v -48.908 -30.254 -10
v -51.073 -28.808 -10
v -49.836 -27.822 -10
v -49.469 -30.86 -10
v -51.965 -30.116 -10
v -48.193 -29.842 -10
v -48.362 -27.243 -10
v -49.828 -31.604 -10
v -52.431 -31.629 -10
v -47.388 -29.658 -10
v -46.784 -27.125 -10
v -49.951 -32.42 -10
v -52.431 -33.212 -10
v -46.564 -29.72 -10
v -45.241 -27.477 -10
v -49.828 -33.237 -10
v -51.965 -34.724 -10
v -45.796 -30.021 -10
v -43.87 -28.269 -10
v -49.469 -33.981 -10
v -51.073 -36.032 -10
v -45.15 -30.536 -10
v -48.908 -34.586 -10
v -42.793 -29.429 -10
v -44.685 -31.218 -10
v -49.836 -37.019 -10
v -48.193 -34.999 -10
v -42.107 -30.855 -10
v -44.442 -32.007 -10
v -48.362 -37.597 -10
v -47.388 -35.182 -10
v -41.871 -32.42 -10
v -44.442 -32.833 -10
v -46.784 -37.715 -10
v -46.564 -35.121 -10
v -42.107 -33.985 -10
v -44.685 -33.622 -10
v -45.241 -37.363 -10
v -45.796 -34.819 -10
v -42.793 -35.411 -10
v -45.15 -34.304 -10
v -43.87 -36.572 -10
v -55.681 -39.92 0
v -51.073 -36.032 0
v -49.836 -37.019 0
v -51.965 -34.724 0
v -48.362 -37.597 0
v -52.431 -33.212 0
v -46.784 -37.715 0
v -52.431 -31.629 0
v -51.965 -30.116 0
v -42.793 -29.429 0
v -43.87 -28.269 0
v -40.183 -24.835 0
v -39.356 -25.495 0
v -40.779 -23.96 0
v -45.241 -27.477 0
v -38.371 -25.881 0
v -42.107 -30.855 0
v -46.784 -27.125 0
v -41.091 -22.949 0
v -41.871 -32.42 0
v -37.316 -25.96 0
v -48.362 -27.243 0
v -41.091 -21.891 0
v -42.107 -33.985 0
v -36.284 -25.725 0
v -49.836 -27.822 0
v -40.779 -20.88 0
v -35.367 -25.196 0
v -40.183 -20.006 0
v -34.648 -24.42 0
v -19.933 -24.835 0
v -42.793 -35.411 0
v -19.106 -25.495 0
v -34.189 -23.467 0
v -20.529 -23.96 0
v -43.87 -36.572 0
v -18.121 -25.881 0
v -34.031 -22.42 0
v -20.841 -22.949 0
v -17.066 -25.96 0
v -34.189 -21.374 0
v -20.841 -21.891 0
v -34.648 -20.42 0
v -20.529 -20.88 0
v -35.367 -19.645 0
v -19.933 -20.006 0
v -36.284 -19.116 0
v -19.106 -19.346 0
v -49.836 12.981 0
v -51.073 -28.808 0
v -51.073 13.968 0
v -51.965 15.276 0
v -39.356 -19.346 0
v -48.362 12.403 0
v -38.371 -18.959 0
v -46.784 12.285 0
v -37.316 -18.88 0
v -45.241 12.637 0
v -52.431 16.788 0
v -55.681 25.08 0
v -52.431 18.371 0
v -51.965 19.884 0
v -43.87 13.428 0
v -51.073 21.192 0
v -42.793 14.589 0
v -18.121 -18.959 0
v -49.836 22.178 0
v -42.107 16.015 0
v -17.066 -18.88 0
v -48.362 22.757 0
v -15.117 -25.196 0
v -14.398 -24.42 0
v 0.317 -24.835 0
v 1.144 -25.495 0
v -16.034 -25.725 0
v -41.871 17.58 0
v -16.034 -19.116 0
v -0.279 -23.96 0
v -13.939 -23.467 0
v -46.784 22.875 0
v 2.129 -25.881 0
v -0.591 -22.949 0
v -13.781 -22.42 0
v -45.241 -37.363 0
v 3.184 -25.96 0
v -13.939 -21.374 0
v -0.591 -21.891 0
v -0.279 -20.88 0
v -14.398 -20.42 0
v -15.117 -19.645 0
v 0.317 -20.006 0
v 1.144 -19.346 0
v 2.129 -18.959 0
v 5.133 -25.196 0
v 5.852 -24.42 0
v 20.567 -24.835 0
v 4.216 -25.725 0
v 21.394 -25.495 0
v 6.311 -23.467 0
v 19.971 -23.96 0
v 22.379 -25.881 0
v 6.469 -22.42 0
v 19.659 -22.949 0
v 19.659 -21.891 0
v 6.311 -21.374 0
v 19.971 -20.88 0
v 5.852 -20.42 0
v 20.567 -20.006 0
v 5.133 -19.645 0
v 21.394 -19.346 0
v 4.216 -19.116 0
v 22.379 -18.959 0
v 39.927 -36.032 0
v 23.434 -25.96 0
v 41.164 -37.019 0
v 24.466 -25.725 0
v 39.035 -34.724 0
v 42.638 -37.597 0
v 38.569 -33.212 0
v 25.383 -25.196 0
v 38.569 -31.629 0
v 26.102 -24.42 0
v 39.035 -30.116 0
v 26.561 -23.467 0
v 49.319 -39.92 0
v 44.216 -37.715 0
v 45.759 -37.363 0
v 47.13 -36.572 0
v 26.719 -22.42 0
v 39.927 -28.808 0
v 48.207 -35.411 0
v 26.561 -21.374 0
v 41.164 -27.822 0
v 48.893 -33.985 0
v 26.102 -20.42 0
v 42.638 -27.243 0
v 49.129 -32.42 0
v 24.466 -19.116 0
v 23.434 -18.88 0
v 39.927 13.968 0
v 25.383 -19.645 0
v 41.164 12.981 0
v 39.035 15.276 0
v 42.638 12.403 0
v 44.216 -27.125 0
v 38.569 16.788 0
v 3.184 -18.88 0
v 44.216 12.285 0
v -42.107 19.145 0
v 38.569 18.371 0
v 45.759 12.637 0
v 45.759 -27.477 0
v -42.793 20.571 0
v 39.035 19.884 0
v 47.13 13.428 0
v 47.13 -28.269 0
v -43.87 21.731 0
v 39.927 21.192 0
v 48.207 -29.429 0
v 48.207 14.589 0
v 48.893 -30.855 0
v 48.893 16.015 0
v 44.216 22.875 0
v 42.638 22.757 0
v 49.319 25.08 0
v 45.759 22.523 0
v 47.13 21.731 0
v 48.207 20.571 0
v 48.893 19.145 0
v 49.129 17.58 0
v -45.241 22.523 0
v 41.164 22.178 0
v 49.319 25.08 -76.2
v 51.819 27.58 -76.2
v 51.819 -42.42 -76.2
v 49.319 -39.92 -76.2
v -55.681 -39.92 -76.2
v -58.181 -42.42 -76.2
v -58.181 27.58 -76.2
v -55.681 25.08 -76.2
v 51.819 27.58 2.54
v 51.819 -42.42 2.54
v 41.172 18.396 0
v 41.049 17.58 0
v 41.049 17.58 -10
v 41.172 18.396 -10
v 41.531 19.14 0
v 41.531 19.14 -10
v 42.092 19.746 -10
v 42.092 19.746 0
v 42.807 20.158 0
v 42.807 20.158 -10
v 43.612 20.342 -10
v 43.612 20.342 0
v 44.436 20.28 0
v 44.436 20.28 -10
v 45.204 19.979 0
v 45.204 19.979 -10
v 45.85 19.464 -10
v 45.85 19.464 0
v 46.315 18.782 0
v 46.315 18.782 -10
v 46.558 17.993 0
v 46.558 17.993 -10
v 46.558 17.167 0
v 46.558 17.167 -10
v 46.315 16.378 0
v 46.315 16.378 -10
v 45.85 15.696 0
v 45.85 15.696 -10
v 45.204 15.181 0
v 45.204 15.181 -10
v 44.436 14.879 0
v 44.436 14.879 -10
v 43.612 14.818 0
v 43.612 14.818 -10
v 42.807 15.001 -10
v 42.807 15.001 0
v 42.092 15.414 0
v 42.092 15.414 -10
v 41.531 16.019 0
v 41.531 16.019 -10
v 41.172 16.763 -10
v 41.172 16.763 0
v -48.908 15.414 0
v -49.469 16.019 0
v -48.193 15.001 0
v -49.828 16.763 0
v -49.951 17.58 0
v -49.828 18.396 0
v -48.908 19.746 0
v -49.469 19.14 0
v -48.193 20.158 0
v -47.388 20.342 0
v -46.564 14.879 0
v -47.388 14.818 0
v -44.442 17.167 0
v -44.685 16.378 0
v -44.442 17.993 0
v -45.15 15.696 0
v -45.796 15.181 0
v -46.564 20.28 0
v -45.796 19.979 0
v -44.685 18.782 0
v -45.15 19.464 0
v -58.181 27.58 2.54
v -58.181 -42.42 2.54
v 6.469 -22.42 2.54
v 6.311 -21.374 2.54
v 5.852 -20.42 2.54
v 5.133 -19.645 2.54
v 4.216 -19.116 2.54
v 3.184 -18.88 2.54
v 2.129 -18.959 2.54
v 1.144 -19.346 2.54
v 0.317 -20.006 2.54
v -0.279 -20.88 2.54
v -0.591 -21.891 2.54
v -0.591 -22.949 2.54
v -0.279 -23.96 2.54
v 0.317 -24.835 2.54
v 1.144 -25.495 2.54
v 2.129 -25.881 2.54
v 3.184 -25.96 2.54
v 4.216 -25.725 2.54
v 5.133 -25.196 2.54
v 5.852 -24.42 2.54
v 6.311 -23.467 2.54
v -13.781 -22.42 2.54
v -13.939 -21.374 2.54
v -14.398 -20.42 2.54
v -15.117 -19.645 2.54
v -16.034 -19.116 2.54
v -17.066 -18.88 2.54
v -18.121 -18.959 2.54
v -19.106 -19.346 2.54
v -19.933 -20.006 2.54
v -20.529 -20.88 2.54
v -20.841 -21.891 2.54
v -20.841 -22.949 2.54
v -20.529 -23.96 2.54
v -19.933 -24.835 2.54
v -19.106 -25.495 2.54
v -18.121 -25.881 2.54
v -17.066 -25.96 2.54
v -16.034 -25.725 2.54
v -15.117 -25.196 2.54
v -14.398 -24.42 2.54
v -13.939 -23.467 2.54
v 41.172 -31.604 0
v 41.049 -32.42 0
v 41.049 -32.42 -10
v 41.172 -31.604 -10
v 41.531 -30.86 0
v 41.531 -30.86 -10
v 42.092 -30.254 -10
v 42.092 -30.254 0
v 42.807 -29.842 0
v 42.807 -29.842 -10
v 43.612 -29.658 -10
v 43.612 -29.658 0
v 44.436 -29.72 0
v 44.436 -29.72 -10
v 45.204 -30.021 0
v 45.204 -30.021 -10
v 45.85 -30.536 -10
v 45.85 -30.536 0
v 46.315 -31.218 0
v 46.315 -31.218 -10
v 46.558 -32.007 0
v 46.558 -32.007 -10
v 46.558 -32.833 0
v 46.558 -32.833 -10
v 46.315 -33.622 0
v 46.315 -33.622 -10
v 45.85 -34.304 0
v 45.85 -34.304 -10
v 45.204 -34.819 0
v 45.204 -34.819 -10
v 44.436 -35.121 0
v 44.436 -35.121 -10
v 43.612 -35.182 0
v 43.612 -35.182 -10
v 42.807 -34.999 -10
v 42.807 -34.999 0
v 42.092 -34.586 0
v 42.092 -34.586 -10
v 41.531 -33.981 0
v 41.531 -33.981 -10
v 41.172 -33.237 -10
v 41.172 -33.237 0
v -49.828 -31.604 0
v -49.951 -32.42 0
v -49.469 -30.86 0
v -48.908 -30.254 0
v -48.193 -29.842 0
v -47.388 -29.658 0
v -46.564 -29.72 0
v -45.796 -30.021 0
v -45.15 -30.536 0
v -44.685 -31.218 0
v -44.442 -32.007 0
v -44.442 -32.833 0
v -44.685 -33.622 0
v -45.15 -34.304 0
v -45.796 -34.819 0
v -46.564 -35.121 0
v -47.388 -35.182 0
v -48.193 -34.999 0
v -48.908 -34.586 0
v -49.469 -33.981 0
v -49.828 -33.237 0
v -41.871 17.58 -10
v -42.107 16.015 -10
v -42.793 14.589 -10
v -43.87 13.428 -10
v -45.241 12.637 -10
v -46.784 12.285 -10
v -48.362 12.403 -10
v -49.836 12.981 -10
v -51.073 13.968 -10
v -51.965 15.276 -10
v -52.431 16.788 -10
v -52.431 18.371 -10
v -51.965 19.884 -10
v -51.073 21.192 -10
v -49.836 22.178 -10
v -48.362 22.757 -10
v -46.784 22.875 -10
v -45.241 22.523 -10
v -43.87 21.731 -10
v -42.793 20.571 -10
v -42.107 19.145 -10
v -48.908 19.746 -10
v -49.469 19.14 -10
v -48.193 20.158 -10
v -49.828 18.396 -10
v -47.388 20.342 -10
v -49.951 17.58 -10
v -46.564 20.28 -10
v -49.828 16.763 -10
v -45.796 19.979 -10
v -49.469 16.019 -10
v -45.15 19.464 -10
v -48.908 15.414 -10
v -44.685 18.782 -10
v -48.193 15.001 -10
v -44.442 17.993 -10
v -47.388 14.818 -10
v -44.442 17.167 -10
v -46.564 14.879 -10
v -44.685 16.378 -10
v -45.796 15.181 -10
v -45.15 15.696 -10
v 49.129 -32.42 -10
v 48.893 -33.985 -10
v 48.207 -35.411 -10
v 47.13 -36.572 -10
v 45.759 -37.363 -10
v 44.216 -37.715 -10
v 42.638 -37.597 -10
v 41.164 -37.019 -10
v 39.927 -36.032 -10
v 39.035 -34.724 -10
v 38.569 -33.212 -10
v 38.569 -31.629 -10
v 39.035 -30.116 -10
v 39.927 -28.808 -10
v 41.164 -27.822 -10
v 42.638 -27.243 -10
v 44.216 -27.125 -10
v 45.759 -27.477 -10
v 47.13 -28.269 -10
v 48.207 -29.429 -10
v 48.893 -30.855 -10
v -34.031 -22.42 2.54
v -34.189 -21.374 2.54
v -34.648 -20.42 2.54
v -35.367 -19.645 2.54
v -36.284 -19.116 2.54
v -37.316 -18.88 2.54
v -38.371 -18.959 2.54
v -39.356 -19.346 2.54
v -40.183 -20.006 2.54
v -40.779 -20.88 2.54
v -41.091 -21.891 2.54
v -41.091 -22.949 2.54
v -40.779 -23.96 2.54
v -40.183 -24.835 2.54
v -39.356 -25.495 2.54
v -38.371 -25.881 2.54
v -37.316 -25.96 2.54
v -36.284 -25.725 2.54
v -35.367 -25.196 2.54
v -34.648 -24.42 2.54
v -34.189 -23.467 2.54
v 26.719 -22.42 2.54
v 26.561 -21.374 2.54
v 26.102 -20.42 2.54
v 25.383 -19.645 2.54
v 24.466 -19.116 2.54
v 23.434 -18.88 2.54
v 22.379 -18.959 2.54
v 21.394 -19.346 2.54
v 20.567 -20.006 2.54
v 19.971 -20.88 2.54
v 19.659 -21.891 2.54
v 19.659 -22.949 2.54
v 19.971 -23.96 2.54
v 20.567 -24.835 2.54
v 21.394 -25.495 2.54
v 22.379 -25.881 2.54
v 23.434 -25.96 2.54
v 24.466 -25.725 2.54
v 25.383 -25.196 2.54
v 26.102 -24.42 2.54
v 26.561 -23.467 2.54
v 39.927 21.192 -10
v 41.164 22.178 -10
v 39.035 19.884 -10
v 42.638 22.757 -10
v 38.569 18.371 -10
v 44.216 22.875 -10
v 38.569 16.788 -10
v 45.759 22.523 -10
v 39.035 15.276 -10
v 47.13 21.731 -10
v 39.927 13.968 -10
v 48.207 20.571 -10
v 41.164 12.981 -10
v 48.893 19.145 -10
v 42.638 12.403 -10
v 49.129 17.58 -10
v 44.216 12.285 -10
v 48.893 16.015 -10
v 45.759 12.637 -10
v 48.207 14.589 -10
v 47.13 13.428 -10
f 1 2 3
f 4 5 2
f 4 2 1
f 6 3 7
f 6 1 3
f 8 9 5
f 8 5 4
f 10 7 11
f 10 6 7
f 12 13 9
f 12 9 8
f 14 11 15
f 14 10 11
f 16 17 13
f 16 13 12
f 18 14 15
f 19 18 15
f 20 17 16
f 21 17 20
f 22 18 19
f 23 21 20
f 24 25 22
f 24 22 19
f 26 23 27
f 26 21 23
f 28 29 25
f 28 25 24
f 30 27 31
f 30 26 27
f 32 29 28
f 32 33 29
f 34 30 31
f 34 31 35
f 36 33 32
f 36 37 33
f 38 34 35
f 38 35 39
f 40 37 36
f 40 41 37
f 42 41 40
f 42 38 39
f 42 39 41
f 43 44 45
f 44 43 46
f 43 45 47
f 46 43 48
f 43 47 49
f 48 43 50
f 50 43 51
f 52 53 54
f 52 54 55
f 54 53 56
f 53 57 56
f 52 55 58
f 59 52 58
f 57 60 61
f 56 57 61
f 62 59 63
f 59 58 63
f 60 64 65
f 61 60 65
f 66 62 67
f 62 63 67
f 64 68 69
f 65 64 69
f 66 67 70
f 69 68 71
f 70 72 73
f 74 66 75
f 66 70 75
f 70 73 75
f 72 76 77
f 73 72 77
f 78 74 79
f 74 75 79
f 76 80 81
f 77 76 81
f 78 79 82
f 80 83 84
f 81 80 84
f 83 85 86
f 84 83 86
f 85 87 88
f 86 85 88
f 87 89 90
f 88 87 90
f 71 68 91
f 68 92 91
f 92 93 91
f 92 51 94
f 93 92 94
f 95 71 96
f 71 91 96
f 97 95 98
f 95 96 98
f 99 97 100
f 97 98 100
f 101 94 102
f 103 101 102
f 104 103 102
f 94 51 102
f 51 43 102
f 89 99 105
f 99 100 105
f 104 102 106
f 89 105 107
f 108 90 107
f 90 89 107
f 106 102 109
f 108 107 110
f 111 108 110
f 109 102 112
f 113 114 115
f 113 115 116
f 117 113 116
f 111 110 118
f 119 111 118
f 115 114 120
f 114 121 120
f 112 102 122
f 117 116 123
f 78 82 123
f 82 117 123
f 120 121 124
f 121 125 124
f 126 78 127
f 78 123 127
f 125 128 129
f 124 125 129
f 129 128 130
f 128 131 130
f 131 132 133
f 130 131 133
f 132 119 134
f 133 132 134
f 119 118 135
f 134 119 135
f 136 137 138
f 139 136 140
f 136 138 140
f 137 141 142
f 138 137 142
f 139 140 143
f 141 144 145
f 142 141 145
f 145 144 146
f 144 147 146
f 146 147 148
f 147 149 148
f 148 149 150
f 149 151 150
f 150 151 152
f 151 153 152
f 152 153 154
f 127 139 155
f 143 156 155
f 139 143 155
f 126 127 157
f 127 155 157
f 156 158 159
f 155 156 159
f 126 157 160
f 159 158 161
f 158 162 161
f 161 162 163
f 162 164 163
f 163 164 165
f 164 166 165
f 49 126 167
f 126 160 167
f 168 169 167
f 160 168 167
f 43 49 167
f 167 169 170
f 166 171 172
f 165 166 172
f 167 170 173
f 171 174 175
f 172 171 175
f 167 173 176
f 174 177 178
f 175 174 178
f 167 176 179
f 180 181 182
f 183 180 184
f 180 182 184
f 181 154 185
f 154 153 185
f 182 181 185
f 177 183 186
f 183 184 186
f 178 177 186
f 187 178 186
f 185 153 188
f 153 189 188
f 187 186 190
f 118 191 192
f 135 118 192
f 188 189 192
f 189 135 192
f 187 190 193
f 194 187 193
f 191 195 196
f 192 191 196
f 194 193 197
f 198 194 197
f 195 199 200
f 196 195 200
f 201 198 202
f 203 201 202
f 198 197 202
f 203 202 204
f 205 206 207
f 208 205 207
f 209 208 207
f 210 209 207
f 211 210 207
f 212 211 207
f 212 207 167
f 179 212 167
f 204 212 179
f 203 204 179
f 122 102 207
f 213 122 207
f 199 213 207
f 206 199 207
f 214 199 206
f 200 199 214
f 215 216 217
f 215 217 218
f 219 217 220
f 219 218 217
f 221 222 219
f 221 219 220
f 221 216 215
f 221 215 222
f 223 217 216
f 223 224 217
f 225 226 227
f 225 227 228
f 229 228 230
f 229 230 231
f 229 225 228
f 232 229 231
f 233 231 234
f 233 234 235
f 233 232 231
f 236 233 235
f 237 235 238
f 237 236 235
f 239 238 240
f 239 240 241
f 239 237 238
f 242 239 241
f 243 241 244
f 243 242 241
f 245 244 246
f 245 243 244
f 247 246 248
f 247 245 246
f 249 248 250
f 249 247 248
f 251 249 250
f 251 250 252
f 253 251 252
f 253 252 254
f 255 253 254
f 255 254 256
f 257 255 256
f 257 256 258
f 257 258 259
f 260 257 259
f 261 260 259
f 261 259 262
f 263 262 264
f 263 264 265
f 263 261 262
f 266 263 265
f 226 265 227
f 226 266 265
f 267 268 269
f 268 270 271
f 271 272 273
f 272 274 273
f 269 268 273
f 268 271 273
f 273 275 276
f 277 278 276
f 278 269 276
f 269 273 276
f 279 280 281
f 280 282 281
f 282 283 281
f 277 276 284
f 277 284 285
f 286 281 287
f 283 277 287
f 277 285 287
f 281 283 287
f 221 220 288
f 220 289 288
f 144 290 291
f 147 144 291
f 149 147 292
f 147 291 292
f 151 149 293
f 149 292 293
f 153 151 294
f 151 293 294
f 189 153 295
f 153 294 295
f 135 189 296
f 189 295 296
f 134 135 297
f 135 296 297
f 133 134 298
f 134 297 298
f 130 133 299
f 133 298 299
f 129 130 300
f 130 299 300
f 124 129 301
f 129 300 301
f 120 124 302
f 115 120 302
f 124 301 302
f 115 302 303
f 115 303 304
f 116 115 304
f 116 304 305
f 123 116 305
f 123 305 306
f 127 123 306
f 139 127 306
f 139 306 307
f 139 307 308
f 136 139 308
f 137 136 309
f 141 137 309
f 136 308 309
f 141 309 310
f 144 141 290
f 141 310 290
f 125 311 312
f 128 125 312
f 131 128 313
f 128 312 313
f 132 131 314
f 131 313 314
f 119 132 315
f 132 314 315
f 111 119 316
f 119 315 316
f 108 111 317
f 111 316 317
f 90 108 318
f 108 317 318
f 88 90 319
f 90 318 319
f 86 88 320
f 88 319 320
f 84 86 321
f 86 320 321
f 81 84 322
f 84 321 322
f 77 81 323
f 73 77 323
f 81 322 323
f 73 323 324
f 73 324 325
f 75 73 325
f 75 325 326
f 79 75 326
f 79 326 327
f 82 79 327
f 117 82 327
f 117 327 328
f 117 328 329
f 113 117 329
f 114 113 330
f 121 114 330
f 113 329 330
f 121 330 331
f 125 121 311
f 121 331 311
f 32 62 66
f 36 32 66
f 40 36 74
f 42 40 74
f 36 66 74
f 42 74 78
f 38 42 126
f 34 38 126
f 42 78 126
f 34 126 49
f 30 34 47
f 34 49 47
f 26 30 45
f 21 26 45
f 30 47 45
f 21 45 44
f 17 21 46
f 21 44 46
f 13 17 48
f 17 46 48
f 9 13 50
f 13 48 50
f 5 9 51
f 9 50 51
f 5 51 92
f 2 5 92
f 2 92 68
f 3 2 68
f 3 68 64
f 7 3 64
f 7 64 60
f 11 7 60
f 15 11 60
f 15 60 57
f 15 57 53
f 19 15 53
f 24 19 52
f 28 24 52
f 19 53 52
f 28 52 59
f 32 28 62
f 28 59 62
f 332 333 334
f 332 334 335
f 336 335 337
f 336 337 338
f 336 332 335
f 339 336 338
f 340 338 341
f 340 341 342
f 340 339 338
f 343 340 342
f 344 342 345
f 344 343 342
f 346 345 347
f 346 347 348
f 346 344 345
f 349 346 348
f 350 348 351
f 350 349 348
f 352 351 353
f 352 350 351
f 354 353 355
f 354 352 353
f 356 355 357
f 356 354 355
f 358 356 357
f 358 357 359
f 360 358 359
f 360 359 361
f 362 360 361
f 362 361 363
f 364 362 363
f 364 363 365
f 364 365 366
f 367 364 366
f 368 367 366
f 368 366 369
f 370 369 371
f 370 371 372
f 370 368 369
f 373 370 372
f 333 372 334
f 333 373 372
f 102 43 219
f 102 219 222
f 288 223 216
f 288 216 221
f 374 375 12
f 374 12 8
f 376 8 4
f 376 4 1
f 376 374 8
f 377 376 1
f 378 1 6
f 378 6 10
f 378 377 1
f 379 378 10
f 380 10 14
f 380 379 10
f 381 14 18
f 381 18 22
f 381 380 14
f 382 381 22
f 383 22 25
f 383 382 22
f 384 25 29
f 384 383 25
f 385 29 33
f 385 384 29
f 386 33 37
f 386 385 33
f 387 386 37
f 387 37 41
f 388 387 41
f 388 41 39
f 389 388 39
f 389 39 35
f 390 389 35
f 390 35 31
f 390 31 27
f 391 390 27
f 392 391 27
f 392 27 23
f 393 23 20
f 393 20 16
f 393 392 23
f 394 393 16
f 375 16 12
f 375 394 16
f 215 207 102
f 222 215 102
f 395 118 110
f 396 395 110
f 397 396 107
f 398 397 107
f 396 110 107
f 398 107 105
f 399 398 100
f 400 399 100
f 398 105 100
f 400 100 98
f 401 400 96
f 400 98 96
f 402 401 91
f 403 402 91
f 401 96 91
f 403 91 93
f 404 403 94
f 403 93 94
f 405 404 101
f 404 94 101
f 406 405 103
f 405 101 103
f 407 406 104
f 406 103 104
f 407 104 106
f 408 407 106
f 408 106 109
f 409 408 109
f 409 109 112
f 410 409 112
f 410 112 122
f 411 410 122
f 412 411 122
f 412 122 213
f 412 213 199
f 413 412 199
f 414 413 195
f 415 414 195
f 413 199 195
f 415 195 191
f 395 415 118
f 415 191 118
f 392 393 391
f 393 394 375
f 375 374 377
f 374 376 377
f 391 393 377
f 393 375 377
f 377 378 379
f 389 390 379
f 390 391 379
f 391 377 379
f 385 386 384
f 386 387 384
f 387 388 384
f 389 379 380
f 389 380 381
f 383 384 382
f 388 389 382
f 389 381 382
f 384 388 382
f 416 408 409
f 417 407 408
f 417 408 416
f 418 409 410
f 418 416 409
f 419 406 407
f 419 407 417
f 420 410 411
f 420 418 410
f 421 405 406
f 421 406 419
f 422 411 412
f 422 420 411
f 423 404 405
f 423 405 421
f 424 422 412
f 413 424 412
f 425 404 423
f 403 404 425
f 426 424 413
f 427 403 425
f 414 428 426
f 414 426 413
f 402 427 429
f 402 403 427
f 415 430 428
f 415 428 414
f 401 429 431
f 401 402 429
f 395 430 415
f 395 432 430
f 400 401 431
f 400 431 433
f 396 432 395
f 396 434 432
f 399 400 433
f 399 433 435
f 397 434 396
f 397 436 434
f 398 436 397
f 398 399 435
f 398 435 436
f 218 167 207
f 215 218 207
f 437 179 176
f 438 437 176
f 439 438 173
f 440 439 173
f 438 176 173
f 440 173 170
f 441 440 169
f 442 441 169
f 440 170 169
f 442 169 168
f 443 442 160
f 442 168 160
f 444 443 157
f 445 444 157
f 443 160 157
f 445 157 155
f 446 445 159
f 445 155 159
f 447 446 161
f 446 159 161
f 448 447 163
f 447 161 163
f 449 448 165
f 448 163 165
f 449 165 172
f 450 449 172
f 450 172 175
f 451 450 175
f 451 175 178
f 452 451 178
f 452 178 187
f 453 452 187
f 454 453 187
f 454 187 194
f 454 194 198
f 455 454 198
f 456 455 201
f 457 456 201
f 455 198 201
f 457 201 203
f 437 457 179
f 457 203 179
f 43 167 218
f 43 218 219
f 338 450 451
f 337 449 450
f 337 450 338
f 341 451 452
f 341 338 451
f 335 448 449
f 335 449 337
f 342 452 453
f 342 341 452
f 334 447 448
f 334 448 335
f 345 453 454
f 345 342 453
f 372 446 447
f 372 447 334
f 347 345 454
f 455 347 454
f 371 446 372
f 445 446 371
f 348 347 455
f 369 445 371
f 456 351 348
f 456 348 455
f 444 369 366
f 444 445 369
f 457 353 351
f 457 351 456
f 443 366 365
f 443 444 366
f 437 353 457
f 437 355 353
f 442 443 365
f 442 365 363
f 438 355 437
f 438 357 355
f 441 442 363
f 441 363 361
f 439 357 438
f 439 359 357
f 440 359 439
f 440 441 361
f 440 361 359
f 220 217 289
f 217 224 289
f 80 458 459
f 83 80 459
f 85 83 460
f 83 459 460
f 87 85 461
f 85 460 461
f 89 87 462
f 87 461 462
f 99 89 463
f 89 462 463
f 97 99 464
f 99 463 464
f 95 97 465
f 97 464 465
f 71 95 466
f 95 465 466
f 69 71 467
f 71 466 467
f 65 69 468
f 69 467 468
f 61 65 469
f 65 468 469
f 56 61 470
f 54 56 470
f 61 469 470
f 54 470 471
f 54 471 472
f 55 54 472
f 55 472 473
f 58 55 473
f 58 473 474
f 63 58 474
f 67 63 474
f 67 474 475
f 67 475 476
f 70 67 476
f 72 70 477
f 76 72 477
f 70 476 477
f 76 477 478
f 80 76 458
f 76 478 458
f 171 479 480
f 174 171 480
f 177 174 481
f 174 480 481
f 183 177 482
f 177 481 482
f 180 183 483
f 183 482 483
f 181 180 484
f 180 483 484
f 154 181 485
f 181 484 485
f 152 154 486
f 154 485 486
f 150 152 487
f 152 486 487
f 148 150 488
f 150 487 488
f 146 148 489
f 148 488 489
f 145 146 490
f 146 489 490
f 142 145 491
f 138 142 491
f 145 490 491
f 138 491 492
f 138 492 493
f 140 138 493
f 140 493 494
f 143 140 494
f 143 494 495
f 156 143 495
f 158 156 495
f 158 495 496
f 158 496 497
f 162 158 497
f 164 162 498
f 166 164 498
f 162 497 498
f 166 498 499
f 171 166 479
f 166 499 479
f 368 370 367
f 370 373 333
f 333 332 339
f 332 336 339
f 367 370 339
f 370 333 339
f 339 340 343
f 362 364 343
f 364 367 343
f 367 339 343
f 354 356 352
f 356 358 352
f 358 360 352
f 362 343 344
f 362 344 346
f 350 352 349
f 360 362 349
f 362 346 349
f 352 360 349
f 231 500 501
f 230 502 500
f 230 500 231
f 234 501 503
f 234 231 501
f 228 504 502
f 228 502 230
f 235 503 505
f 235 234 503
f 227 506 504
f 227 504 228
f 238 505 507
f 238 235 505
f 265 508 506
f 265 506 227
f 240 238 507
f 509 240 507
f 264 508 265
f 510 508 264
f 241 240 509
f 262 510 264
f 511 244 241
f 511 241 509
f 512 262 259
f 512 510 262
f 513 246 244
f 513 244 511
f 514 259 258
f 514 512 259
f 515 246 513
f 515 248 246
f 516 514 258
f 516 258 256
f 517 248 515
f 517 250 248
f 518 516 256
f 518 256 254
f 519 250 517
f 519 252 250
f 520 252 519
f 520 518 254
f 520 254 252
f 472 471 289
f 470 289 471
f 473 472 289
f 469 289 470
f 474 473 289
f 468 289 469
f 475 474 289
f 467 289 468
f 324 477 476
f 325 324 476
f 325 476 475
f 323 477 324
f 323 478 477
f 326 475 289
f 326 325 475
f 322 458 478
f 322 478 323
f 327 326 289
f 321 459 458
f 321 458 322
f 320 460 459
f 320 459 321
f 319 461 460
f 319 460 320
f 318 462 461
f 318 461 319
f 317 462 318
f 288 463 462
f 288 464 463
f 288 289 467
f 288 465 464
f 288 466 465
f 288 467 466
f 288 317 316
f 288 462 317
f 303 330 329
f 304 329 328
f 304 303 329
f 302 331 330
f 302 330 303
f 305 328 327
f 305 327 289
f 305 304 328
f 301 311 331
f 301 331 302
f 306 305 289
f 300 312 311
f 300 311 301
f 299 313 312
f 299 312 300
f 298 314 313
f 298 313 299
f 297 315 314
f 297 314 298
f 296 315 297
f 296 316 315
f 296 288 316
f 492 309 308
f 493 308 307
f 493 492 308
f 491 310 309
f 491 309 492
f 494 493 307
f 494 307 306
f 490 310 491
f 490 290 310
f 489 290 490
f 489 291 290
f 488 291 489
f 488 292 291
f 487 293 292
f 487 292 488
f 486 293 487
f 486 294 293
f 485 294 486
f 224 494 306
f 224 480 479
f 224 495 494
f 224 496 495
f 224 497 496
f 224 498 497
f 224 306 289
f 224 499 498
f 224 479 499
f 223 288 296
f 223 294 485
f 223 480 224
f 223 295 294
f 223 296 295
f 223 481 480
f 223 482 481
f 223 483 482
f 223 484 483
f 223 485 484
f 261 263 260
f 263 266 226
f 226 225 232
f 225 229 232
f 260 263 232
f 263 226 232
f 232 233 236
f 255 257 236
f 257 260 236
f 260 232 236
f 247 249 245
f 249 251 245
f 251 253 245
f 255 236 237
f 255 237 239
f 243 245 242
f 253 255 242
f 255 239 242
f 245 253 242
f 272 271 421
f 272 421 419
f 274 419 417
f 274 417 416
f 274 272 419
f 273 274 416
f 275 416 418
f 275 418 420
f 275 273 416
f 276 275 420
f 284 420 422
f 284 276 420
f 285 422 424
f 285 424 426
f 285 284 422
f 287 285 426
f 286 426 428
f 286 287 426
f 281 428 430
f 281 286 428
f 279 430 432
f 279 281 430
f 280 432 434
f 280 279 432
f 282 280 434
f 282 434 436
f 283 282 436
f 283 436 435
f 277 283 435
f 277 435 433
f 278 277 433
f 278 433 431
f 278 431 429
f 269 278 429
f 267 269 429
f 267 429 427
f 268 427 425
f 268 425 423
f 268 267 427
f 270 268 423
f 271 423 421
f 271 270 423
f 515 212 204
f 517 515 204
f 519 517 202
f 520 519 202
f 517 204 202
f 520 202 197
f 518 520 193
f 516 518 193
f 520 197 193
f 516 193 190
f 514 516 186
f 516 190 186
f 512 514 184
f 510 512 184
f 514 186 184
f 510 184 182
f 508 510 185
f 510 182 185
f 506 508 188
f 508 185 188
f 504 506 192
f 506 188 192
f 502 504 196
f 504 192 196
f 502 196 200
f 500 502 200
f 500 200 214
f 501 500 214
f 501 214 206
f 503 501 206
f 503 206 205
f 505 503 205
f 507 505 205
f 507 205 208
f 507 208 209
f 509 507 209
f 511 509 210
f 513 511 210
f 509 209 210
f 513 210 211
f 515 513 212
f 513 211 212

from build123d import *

# Parameters (mm, degrees)
SKETCH1_W           = 110
SKETCH1_H           = 70
BOSS_EXTRUDE1_DEPTH = 2.54
SKETCH4_W           = 110
SKETCH4_H           = 70
SKETCH4_W_2         = 105
SKETCH4_H_2         = 65
BOSS_EXTRUDE3_DEPTH = 76.2
SKETCH7_R           = 5.31
SKETCH7_R_2         = 2.77
BOSS_EXTRUDE5_DEPTH = 10
SKETCH9_R           = 3.55
CUT_EXTRUDE1_DEPTH  = 2.54


with BuildPart() as part:
    # Sketch1 → Boss-Extrude1 (new body)
    with BuildSketch(Plane.XY):
        with Locations((-3.180803055, -7.420155336)):
            Rectangle(SKETCH1_W, SKETCH1_H)
    extrude(amount=BOSS_EXTRUDE1_DEPTH)

    # Sketch4 → Boss-Extrude3 (add)
    with BuildSketch(Plane(origin=(0, 0, 0), x_dir=(-1, 0, 0), z_dir=(0, 0, -1))):
        with Locations((3.180803055, -7.420155336)):
            Rectangle(SKETCH4_W, SKETCH4_H)
        with Locations((3.180803055, -7.420155336)):
            Rectangle(SKETCH4_W_2, SKETCH4_H_2, mode=Mode.SUBTRACT)
    extrude(amount=BOSS_EXTRUDE3_DEPTH)

    # Sketch7 → Boss-Extrude5 (add)
    # profile 1 of 4: a face of its own
    with BuildSketch(Plane(origin=(0, 0, 0), x_dir=(-1, 0, 0), z_dir=(0, 0, -1))):
        with Locations(Location((-43.819196945, 17.579844664, 0), (0, 0, 180))):
            Circle(SKETCH7_R)
        with Locations((-43.819196945, 17.579844664)):
            Circle(SKETCH7_R_2, mode=Mode.SUBTRACT)
    # profile 2 of 4: a face of its own
    with BuildSketch(Plane(origin=(0, 0, 0), x_dir=(-1, 0, 0), z_dir=(0, 0, -1))):
        with Locations(Location((47.180803055, 17.579844664, 0), (0, 0, 180))):
            Circle(SKETCH7_R)
        with Locations((47.180803055, 17.579844664)):
            Circle(SKETCH7_R_2, mode=Mode.SUBTRACT)
    # profile 3 of 4: a face of its own
    with BuildSketch(Plane(origin=(0, 0, 0), x_dir=(-1, 0, 0), z_dir=(0, 0, -1))):
        with Locations(Location((47.180803055, -32.420155336, 0), (0, 0, 180))):
            Circle(SKETCH7_R)
        with Locations((47.180803055, -32.420155336)):
            Circle(SKETCH7_R_2, mode=Mode.SUBTRACT)
    # profile 4 of 4: a face of its own
    with BuildSketch(Plane(origin=(0, 0, 0), x_dir=(-1, 0, 0), z_dir=(0, 0, -1))):
        with Locations(Location((-43.819196945, -32.420155336, 0), (0, 0, 180))):
            Circle(SKETCH7_R)
        with Locations((-43.819196945, -32.420155336)):
            Circle(SKETCH7_R_2, mode=Mode.SUBTRACT)
    extrude(amount=BOSS_EXTRUDE5_DEPTH)

    # Sketch9 → Cut-Extrude1 (cut)
    with BuildSketch(Plane.XY.offset(2.54)):
        with Locations((23.169196945, -22.420155336)):
            Circle(SKETCH9_R)
        with Locations((2.919196945, -22.420155336)):
            Circle(SKETCH9_R)
        with Locations((-17.330803055, -22.420155336)):
            Circle(SKETCH9_R)
        with Locations((-37.580803055, -22.420155336)):
            Circle(SKETCH9_R)
    extrude(amount=-CUT_EXTRUDE1_DEPTH, mode=Mode.SUBTRACT)


solid = part.part
